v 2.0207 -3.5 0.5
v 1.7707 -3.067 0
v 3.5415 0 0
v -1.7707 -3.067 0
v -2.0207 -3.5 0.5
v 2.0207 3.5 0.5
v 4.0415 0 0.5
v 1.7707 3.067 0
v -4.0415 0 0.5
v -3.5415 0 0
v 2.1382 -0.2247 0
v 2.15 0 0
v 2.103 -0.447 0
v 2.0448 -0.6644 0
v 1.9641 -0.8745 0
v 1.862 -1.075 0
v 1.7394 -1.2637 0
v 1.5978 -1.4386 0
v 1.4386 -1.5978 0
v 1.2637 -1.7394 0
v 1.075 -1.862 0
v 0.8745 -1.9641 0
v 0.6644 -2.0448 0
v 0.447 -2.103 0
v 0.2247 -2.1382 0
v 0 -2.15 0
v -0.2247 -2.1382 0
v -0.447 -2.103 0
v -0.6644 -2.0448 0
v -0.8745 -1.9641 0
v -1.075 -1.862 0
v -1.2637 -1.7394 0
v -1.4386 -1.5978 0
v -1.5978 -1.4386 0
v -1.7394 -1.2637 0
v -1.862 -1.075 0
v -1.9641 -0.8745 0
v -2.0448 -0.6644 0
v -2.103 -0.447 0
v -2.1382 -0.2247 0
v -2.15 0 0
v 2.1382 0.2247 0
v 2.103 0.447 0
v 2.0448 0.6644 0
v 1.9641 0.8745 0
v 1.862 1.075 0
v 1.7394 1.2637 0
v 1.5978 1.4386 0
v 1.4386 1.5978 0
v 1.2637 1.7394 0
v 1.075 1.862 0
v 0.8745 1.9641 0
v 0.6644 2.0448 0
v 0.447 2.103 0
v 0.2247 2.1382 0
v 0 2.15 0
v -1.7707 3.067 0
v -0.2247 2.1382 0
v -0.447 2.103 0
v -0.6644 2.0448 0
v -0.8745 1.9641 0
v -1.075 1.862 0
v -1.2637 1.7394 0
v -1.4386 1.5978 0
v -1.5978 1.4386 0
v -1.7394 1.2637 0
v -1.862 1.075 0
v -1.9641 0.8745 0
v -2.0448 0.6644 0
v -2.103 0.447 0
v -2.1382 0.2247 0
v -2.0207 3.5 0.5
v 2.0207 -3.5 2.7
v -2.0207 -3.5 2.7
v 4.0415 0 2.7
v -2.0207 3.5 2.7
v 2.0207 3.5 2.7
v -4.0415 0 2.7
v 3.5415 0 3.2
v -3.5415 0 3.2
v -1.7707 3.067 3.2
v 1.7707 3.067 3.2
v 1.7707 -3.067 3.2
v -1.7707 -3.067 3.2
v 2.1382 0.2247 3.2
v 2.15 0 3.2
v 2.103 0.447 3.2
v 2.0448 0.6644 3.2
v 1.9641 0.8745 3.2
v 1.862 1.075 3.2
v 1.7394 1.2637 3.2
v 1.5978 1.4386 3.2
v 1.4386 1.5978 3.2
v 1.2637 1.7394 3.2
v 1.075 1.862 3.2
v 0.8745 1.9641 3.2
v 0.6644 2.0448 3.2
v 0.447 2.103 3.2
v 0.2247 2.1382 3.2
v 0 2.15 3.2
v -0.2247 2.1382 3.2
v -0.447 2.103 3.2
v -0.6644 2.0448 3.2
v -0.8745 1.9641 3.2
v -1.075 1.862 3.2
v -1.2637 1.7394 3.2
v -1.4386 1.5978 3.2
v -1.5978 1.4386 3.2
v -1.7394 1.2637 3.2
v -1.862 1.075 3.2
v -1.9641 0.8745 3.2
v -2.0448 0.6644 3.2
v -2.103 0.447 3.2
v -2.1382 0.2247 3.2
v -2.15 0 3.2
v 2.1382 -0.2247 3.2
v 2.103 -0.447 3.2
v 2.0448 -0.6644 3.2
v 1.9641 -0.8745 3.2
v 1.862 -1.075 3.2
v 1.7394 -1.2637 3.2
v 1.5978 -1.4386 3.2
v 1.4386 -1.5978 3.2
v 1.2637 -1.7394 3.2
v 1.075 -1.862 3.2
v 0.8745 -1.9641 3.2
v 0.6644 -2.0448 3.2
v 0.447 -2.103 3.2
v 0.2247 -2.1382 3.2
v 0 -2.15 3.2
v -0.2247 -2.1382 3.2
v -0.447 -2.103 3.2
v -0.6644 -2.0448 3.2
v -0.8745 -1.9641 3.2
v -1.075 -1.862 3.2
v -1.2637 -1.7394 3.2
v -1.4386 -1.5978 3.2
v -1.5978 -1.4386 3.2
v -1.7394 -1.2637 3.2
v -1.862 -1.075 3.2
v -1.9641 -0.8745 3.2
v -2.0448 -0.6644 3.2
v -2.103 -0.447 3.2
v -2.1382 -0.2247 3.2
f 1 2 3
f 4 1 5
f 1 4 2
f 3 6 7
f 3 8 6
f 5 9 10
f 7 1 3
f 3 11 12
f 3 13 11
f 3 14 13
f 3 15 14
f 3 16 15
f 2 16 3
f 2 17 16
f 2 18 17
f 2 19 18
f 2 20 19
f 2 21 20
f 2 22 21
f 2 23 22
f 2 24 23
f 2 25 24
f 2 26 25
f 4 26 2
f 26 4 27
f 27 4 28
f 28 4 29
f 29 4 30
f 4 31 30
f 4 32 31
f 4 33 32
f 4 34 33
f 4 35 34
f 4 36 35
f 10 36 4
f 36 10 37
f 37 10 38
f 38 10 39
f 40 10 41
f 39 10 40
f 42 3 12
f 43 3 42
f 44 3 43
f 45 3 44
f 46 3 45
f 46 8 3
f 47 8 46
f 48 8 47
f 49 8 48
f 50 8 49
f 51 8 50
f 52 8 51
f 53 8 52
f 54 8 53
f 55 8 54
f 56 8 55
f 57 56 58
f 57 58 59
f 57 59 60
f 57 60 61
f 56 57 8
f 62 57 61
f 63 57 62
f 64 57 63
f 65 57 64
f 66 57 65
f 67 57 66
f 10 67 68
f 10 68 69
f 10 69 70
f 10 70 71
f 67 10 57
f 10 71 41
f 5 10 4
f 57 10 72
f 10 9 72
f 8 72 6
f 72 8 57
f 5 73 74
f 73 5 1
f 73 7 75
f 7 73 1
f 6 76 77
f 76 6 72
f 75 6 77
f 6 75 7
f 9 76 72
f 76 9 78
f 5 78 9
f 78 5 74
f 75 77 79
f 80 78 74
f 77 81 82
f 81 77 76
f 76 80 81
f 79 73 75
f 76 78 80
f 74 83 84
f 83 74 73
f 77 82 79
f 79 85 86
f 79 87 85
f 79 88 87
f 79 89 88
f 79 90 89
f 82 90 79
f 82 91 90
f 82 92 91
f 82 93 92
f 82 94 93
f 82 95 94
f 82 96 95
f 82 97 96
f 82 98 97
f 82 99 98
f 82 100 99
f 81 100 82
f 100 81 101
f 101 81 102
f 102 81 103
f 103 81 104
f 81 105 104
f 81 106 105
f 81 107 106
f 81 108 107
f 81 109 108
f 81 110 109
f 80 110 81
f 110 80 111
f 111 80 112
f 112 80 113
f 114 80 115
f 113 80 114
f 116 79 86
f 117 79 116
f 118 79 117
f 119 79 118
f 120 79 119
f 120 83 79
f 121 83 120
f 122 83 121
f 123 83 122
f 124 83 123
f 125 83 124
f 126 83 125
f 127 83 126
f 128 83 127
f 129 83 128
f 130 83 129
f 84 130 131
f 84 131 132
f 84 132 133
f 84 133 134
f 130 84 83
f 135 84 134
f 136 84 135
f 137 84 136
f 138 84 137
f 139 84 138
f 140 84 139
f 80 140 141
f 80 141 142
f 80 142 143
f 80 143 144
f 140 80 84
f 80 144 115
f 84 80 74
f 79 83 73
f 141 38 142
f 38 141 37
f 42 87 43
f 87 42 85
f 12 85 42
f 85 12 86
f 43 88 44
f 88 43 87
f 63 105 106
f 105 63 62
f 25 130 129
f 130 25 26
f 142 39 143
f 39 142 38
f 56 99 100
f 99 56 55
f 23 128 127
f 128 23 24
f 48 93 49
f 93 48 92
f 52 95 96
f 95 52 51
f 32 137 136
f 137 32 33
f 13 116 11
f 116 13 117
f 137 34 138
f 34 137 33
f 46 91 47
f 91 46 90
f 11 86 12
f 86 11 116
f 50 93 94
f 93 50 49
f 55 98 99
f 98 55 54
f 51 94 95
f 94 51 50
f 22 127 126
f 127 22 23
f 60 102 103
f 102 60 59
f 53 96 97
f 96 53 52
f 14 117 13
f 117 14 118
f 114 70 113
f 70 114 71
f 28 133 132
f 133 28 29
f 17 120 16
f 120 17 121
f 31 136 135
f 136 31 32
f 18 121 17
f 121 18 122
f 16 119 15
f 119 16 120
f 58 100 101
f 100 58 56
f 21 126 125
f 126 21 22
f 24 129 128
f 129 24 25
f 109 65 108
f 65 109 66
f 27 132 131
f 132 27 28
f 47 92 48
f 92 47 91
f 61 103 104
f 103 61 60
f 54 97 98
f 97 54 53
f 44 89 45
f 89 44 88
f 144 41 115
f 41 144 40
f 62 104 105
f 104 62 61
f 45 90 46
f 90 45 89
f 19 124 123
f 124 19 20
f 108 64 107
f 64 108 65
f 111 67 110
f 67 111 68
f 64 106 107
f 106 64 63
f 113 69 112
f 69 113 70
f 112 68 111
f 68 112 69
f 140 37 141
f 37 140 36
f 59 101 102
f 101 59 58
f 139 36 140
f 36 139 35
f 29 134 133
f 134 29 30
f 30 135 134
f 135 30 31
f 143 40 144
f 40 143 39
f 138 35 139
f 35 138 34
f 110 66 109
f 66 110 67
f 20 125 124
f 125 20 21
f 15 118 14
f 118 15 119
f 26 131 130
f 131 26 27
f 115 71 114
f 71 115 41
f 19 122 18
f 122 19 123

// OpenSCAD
// Through hex nut.
$fn = 60;
eps = 0.02;
thread_clearance_d = 4.3;
flat = 7;
thickness = 3.2;
chamfer = 0.5;
difference() {
    union() {
        cylinder(d1 = flat / cos(30) - 2 * chamfer, d2 = flat / cos(30), h = chamfer, $fn = 6);
        translate([0, 0, chamfer]) cylinder(d = flat / cos(30), h = thickness - 2 * chamfer, $fn = 6);
        translate([0, 0, thickness - chamfer]) cylinder(d1 = flat / cos(30), d2 = flat / cos(30) - 2 * chamfer, h = chamfer, $fn = 6);
    }
    translate([0, 0, -eps]) cylinder(d = thread_clearance_d, h = thickness + 2 * eps);
}
